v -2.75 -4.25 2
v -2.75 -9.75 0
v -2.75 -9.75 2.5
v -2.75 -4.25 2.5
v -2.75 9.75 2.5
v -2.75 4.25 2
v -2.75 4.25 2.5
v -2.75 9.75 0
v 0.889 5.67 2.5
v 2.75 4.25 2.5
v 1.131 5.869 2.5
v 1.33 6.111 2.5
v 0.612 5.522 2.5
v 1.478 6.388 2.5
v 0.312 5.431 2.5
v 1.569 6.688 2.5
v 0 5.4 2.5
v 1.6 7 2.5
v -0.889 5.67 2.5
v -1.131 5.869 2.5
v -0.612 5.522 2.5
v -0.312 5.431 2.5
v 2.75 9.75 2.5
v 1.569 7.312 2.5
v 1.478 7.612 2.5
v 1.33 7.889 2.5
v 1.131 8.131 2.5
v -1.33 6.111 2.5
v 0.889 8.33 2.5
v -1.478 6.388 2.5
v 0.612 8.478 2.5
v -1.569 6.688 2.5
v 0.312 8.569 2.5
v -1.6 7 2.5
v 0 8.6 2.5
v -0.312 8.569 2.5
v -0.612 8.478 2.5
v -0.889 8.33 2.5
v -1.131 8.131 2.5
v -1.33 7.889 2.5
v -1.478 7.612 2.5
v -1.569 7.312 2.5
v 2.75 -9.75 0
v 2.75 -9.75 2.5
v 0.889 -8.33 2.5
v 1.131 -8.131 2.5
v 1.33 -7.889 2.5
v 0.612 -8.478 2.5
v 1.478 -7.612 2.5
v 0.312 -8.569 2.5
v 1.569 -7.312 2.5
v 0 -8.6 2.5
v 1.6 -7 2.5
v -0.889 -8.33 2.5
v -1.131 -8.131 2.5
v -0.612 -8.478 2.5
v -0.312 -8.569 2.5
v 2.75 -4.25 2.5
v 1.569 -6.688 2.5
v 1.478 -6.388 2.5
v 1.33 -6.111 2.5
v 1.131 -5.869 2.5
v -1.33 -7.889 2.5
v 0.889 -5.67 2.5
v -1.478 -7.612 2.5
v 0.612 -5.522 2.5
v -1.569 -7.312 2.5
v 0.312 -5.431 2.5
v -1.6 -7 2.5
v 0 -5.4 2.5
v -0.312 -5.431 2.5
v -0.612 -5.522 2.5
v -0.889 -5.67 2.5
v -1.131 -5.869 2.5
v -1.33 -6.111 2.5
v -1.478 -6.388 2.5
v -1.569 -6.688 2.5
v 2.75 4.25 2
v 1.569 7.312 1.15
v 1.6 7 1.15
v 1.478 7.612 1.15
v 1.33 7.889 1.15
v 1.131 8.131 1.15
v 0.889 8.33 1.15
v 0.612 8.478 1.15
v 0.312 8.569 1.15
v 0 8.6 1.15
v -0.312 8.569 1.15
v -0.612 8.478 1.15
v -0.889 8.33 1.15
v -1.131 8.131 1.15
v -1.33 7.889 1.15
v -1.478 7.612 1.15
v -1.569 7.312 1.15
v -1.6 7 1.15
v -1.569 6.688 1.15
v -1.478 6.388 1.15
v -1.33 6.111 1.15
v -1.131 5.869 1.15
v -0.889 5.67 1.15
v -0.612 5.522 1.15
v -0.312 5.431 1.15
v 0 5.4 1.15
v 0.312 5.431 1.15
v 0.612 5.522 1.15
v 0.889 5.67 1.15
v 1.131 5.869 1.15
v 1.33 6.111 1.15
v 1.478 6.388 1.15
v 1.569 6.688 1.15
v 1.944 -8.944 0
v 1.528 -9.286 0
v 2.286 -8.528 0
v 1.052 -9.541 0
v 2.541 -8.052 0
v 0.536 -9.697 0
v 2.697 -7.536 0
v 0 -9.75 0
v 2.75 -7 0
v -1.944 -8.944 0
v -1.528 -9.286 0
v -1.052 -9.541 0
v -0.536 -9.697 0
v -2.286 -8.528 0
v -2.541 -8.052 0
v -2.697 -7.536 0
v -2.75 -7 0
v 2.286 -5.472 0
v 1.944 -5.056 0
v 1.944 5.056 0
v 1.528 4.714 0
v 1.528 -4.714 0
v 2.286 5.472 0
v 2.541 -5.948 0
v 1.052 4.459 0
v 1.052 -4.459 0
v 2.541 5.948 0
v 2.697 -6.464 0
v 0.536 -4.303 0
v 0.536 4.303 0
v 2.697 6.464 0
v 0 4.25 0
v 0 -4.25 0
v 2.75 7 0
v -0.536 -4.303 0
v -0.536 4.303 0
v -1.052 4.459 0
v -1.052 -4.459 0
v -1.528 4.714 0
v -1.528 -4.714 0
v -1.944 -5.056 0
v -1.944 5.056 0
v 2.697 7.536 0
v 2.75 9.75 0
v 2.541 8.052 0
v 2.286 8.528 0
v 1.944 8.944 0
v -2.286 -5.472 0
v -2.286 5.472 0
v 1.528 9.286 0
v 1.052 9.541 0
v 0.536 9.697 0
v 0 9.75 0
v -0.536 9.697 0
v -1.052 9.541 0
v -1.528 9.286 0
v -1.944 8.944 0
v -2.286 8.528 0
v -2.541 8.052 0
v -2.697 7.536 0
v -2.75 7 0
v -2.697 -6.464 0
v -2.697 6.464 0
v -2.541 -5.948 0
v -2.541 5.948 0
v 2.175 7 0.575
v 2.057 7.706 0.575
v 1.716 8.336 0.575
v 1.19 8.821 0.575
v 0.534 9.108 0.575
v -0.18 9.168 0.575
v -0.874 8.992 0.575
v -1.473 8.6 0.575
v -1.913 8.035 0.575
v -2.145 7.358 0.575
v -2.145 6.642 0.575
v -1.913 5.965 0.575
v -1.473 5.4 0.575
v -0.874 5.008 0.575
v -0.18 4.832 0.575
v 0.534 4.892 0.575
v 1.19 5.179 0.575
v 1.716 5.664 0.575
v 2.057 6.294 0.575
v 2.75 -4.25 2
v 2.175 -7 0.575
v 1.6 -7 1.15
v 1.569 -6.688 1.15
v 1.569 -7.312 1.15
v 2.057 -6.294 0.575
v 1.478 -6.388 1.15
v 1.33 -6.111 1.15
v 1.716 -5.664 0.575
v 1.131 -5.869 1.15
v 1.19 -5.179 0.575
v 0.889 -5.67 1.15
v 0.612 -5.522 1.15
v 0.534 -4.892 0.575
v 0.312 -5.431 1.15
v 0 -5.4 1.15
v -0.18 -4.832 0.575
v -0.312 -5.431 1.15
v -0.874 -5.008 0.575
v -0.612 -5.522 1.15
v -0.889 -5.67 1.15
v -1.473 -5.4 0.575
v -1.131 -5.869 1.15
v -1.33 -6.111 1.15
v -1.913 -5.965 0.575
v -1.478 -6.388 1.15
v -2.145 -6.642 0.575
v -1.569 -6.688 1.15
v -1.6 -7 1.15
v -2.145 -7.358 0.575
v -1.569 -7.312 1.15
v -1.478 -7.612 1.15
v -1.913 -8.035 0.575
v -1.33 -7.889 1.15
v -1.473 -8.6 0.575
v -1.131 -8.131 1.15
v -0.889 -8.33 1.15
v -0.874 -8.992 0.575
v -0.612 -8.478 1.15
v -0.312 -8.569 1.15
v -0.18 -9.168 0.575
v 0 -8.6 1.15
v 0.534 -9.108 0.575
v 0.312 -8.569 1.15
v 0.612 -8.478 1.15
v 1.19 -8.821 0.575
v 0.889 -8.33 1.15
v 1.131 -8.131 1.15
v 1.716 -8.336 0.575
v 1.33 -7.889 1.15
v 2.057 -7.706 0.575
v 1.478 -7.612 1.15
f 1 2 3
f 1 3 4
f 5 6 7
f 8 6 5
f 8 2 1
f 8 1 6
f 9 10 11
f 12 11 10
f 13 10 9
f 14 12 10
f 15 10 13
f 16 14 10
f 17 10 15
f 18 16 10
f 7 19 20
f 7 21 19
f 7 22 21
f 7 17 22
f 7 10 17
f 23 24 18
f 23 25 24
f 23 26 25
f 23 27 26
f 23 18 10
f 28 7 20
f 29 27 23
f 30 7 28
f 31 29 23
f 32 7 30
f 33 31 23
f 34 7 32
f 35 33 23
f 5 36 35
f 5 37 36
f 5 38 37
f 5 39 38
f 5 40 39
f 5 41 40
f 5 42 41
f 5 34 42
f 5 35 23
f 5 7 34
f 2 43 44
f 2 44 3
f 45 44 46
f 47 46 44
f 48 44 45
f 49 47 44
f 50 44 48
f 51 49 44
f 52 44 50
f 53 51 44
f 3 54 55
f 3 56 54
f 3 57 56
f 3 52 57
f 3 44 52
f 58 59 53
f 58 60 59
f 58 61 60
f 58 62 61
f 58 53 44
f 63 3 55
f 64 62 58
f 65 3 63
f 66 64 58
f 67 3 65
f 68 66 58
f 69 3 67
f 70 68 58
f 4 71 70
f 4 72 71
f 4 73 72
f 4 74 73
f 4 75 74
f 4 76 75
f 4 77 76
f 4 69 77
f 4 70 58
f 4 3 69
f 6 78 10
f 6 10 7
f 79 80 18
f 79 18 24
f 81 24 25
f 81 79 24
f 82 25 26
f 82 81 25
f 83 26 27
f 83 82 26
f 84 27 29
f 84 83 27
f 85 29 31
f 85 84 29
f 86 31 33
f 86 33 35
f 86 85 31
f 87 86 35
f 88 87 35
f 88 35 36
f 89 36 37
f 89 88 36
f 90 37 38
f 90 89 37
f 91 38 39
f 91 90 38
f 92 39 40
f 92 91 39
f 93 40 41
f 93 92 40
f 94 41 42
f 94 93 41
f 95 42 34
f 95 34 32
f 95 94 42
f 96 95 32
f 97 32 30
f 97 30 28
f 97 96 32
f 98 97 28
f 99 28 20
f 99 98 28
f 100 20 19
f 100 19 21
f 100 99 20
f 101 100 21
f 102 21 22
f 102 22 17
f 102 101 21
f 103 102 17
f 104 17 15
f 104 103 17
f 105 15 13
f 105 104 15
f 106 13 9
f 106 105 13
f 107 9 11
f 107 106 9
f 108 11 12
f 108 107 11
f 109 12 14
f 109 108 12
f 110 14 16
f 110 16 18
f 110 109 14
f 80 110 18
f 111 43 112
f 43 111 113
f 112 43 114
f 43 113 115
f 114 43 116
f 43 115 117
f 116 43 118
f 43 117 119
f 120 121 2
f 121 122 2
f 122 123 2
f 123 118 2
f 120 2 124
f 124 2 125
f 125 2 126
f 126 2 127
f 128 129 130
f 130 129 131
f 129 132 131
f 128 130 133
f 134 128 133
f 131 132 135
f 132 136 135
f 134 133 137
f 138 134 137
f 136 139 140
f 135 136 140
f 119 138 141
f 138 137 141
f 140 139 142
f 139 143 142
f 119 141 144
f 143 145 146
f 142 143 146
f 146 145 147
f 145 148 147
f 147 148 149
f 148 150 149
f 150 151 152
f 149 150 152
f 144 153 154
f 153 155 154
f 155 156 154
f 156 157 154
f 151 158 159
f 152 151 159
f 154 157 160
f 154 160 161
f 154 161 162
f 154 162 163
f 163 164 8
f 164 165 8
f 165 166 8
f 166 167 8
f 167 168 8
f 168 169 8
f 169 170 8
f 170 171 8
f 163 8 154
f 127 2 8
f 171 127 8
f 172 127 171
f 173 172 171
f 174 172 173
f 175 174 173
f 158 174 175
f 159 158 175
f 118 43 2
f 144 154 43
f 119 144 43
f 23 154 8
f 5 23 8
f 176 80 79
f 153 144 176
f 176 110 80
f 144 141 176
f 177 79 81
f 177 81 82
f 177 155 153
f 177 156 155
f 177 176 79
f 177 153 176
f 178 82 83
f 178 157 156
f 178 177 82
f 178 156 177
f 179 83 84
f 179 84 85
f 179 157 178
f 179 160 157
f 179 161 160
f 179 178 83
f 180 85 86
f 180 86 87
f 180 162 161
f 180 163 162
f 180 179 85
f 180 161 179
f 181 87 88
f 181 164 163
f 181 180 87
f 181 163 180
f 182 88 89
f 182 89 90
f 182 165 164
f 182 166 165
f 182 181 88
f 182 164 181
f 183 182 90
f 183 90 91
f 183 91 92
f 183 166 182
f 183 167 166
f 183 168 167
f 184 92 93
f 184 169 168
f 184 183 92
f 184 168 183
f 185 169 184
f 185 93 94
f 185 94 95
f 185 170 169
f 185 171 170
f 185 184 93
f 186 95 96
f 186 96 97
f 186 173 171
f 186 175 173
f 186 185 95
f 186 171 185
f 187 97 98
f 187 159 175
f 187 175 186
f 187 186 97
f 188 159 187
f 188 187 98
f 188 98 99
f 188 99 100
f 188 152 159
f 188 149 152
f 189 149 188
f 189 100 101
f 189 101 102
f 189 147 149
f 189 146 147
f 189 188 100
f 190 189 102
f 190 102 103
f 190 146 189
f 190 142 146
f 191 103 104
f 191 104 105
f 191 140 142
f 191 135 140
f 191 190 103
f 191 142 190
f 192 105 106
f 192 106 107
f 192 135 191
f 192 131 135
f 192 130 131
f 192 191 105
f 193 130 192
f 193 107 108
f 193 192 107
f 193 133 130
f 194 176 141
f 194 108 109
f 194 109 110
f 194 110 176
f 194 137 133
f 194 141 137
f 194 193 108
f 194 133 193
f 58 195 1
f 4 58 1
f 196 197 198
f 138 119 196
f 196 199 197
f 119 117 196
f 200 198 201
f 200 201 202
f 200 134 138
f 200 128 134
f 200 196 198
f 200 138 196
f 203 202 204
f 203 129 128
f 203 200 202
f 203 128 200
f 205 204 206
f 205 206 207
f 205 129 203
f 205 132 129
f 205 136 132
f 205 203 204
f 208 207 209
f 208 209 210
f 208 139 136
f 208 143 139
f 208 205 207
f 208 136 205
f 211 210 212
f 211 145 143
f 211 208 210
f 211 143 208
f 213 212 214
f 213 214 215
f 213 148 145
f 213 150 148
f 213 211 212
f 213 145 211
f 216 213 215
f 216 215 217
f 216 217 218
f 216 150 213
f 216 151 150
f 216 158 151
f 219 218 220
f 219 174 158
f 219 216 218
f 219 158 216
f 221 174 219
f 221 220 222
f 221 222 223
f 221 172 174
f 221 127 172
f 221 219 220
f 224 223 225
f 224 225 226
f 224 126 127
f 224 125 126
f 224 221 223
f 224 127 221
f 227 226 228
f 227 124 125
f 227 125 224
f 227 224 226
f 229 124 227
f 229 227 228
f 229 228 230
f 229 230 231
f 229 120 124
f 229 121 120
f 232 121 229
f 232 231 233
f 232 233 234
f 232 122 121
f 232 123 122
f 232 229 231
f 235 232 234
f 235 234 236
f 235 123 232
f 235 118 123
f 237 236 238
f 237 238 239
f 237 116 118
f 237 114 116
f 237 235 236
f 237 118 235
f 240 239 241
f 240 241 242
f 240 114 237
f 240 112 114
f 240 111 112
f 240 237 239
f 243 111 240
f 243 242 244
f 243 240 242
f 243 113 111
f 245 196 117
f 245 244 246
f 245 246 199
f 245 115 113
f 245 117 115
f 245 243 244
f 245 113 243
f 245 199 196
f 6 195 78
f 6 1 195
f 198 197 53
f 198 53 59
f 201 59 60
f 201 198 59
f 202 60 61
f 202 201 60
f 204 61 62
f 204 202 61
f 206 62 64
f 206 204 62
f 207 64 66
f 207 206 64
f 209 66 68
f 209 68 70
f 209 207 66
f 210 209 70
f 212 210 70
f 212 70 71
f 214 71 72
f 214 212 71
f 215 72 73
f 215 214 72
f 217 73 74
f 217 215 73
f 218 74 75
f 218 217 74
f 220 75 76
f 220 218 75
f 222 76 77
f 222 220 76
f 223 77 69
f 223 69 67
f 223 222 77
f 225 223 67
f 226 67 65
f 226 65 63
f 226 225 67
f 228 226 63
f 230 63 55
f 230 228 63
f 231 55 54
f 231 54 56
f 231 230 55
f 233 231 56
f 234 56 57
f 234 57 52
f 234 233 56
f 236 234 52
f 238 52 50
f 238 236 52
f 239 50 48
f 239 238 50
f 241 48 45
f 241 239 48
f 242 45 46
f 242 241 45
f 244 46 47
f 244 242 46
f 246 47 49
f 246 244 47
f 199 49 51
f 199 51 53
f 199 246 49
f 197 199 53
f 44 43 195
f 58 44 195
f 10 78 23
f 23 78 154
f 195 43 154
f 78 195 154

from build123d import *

# Parameters (mm, degrees)
SKETCH1_W             = 5.5
SKETCH1_H             = 5.5
SKETCH1_R             = 1.6
BOSS_EXTRUDE1_DEPTH   = 2.5
BOSS_EXTRUDE1_2_DEPTH = 2.5
SKETCH1_4_W           = 8.5
SKETCH1_4_H           = 2.75
BOSS_EXTRUDE2_DEPTH   = 2
CHAMFER1_SIZE         = 1.15


with BuildPart() as part:
    # Sketch1 → Boss-Extrude1 (new body)
    with BuildSketch(Plane(origin=(0, 0, 0), x_dir=(0, 1, 0), z_dir=(0, 0, 1))):
        with Locations((-7, 0)):
            Rectangle(SKETCH1_W, SKETCH1_H)
        with Locations(Location((-7, 0, 0), (0, 0, 270))):
            Circle(SKETCH1_R, mode=Mode.SUBTRACT)
    extrude(amount=BOSS_EXTRUDE1_DEPTH)



with BuildPart() as body_2:
    # Sketch1 → Boss-Extrude1 2 (new body)
    with BuildSketch(Plane(origin=(0, 0, 0), x_dir=(0, 1, 0), z_dir=(0, 0, 1))):
        with Locations((7, 0)):
            Rectangle(SKETCH1_W, SKETCH1_H)
        with Locations(Location((7, 0, 0), (0, 0, 270))):
            Circle(SKETCH1_R, mode=Mode.SUBTRACT)
    extrude(amount=BOSS_EXTRUDE1_2_DEPTH)


with BuildPart() as part_1:
    add(part.part)

    add(body_2.part)  # Boss-Extrude2 merges body 2
    # Sketch1<4> → Boss-Extrude2 (add)
    with BuildSketch(Plane(origin=(0, 0, 0), x_dir=(0, 1, 0), z_dir=(0, 0, 1))):
        with Locations((0, -1.375)):
            Rectangle(SKETCH1_4_W, SKETCH1_4_H)
        with Locations((0, 1.375)):
            Rectangle(SKETCH1_4_W, SKETCH1_4_H)
    extrude(amount=BOSS_EXTRUDE2_DEPTH)

    # Chamfer1
    chamfer1_edges = [part_1.edges().sort_by_distance(p)[0] for p in [
        (-1.6, 7, 0),
        (-1.6, -7, 0),
    ]]
    chamfer(chamfer1_edges, length=CHAMFER1_SIZE - 0.0001)  # a hair under: the kernel refuses the full size


solid = part_1.part
